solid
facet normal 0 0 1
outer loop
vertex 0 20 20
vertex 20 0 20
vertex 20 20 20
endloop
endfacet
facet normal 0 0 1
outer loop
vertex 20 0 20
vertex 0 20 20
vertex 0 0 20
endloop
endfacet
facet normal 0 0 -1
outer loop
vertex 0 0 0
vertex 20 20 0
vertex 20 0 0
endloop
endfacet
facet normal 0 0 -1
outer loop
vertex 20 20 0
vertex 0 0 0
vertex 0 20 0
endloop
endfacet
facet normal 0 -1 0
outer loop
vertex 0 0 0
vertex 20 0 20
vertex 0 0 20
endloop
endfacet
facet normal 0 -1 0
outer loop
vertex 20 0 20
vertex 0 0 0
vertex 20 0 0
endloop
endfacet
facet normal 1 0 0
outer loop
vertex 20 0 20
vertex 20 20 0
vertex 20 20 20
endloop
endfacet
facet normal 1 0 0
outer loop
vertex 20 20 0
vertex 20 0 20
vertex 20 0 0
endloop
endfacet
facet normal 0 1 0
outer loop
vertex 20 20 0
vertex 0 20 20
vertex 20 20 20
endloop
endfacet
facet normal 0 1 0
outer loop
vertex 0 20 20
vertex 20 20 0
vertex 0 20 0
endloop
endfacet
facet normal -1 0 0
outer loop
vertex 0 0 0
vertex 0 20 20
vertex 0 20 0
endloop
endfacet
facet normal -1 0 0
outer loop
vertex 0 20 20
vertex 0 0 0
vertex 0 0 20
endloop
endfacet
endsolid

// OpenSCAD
// Basic_Shape_01.scad
// Rectangular Solid

side = 20;
cube (side);
